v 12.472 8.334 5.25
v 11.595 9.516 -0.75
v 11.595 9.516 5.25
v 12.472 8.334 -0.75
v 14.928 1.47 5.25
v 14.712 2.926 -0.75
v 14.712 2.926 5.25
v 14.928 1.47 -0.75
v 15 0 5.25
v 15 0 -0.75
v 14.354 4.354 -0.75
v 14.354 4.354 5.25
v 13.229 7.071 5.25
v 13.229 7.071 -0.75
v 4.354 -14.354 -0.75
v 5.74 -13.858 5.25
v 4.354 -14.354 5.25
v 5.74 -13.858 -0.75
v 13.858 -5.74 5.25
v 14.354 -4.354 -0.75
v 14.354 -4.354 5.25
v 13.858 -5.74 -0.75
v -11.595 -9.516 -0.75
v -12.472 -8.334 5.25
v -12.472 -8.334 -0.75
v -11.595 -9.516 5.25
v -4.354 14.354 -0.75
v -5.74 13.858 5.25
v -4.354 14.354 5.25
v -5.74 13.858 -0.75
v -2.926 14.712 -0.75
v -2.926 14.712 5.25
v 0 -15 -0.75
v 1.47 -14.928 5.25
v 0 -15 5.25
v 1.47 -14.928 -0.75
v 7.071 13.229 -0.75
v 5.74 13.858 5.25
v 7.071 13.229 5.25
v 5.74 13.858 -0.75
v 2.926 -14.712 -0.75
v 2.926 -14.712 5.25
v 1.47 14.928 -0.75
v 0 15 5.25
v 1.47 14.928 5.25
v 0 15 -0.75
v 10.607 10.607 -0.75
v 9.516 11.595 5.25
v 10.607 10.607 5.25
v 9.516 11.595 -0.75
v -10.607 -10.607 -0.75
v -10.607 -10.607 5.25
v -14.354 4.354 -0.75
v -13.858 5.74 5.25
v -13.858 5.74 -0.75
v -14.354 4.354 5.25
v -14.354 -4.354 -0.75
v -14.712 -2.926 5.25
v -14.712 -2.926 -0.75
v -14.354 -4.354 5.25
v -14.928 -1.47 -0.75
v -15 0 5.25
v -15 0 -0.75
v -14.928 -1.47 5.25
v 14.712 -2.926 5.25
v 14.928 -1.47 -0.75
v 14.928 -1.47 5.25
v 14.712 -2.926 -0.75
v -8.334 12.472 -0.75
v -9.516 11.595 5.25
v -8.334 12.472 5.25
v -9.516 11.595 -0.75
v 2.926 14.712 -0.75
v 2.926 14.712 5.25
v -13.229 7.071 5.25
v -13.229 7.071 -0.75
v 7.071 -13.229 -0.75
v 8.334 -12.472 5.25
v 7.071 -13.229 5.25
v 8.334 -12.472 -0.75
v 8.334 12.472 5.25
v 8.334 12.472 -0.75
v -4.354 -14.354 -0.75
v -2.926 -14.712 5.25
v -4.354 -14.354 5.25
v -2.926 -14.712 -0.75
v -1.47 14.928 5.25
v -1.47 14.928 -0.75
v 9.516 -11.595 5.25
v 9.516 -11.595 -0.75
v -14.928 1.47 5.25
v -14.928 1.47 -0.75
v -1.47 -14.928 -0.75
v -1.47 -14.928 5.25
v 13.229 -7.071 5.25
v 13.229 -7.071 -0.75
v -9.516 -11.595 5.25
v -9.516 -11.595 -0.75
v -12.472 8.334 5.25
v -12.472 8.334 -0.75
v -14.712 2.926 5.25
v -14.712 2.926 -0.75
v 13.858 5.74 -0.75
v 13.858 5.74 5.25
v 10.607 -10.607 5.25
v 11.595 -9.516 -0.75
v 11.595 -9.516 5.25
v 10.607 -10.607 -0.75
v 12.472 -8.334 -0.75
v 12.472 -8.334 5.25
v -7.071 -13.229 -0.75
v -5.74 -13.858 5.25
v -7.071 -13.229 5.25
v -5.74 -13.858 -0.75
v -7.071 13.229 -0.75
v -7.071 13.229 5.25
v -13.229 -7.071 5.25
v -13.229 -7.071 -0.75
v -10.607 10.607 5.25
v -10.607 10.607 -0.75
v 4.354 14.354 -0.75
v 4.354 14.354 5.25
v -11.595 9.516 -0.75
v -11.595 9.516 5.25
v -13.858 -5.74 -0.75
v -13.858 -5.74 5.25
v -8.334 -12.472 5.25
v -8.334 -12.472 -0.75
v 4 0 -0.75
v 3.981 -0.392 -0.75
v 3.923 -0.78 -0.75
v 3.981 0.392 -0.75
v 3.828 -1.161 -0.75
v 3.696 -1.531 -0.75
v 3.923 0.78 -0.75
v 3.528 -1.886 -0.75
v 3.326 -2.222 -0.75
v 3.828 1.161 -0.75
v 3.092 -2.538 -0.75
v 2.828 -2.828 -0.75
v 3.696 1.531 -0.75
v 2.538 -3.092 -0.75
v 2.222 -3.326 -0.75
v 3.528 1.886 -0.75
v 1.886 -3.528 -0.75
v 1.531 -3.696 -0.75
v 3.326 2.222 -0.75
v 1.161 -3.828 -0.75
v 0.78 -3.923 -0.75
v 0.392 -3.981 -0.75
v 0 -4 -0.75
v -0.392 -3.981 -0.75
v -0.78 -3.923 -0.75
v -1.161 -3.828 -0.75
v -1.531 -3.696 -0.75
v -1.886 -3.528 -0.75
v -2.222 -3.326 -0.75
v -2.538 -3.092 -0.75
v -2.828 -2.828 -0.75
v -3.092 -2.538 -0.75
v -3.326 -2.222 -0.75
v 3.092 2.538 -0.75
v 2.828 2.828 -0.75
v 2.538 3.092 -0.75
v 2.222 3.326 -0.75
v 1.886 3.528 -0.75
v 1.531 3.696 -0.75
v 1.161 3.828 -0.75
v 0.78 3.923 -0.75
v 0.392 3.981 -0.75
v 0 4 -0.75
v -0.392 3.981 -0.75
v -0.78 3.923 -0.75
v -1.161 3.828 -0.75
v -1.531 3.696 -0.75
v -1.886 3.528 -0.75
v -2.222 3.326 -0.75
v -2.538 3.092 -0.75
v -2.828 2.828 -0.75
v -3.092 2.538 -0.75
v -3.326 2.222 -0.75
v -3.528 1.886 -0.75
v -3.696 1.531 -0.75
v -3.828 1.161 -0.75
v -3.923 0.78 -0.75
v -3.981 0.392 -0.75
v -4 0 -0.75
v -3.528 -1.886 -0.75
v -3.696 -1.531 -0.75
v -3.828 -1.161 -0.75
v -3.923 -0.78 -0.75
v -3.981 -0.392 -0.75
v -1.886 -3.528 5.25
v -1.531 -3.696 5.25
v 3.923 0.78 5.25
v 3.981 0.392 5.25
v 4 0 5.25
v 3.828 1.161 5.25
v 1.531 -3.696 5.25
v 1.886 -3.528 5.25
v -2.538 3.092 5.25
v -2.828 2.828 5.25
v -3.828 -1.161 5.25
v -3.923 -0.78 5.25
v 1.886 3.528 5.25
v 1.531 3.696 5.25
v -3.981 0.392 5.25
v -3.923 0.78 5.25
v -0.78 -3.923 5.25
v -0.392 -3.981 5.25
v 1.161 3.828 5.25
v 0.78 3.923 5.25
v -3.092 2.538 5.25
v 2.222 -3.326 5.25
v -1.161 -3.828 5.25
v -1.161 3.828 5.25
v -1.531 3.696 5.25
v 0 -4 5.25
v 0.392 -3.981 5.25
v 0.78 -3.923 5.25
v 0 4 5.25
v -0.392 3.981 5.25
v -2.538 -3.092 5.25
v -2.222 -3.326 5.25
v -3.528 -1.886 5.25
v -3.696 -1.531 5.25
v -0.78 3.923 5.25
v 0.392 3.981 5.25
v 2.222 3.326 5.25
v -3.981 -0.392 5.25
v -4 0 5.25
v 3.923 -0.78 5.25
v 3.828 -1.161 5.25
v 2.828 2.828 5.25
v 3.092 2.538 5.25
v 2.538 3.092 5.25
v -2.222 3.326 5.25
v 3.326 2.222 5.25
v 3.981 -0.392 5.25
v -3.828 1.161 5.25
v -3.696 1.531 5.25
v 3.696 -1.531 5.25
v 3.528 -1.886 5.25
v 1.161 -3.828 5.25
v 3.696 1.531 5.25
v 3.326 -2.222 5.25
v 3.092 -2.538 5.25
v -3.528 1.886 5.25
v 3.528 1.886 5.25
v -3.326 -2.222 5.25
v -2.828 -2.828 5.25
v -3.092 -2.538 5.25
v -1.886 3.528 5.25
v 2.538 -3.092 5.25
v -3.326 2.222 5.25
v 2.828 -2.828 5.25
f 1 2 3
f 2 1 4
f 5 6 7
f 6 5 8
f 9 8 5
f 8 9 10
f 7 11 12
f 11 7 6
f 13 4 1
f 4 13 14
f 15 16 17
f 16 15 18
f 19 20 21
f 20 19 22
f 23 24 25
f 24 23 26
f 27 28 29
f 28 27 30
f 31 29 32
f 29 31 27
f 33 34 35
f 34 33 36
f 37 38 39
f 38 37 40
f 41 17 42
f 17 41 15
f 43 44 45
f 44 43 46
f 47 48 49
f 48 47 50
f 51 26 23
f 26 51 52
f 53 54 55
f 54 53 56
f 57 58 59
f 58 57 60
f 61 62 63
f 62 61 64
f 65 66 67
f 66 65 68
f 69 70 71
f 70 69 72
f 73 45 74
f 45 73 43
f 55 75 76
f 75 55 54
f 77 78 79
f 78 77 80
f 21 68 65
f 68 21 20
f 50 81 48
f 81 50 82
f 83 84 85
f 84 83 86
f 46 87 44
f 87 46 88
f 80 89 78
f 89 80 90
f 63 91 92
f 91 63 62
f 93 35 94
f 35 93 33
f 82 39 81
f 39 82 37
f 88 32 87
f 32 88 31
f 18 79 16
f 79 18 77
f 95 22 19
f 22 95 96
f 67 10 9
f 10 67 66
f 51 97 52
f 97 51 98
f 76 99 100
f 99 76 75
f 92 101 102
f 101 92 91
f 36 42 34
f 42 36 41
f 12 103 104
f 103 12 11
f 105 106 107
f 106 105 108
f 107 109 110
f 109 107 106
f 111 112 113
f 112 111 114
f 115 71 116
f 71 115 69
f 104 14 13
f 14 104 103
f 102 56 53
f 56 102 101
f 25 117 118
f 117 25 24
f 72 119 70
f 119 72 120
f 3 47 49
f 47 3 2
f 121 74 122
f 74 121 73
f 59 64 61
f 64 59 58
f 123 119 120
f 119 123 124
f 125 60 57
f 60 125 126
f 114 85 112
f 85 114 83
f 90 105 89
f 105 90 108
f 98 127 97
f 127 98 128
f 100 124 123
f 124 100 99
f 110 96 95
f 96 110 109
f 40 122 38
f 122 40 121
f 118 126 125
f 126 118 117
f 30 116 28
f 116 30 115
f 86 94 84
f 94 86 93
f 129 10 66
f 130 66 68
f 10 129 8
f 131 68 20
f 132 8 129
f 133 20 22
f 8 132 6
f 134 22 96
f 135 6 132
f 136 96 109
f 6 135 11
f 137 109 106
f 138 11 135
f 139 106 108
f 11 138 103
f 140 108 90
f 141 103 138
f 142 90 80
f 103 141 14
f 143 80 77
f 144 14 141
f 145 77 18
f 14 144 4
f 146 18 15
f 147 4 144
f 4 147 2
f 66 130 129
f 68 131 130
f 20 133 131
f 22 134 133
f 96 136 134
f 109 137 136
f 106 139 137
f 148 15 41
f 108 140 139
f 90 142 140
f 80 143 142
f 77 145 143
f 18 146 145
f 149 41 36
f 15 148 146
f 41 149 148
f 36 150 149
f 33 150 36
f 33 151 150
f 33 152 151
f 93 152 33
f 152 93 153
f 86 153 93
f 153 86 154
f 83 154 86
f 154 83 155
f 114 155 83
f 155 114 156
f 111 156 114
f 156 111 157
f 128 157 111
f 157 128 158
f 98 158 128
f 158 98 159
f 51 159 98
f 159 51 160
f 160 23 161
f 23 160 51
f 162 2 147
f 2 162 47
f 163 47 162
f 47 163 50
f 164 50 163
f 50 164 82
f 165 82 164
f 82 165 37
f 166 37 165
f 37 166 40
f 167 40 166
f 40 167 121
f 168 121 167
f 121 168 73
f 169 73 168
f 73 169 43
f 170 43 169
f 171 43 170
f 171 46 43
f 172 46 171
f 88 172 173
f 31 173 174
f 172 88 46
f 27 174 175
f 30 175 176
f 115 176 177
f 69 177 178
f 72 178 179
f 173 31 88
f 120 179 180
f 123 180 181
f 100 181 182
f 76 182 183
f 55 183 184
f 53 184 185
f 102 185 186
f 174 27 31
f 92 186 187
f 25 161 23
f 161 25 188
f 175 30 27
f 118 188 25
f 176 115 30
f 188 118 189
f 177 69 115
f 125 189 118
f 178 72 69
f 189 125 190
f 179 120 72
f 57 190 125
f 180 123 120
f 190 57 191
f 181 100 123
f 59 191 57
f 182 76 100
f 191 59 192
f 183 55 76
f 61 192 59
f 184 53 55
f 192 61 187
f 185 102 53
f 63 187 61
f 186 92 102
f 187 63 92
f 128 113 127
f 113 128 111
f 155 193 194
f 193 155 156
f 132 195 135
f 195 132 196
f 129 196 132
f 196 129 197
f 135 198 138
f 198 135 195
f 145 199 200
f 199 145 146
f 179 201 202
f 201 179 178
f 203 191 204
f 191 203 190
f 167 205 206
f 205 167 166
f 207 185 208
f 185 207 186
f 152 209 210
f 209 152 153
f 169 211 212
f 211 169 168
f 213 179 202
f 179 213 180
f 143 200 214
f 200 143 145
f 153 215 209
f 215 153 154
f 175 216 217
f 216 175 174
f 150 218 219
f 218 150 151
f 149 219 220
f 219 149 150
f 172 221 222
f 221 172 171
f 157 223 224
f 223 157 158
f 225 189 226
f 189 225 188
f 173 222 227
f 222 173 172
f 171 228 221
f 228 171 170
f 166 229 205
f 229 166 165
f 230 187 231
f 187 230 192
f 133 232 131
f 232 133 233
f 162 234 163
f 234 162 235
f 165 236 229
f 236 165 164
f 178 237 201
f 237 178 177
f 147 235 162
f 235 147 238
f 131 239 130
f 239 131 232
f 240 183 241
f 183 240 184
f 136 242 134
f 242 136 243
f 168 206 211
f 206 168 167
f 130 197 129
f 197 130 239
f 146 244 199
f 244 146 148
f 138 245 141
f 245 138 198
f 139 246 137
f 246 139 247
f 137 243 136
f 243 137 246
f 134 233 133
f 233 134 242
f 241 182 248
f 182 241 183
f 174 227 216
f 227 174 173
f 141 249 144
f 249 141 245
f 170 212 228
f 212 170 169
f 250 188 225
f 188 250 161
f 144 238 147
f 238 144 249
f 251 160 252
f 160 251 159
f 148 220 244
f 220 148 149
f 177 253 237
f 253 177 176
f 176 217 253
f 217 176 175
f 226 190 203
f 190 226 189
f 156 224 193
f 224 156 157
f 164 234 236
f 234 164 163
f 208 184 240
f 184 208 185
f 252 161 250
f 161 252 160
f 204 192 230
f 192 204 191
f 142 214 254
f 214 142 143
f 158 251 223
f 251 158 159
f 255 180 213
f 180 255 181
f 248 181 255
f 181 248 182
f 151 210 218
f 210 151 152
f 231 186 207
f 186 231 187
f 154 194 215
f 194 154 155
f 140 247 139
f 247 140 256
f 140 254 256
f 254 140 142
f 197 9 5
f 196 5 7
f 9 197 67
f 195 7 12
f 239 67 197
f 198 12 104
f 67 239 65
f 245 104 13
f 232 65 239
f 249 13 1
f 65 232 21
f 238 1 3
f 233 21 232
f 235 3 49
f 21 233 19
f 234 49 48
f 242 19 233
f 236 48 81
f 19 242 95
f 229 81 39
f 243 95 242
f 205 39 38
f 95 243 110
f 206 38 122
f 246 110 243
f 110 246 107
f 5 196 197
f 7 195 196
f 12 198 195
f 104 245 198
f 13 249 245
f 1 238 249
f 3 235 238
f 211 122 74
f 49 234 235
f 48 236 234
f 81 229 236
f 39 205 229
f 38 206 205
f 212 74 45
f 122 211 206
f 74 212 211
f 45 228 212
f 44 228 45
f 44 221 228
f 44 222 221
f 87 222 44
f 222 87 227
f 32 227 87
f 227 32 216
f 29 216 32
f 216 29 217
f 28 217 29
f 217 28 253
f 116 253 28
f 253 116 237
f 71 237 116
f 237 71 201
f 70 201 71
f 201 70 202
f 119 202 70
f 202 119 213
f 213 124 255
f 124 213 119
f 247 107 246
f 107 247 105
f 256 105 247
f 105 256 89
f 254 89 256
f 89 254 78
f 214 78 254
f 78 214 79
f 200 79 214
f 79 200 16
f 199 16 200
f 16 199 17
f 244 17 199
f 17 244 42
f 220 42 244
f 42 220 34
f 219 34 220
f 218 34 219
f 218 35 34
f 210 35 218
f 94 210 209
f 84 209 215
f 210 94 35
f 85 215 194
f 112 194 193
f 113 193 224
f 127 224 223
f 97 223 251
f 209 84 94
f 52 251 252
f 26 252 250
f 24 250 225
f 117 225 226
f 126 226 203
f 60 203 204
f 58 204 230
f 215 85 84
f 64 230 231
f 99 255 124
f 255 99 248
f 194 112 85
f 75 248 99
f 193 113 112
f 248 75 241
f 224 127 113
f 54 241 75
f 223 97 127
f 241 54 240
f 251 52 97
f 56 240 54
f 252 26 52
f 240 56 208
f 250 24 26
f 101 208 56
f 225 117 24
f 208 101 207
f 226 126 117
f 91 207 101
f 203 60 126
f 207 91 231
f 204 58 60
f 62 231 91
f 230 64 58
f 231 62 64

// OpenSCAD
// Parameters
inner_hole_diameter_mm = 8; //[4:16:0.1]
outer_diameter_mm = 30; //[15:60:0.1]
thickness_mm = 1.5; //[0.75:3:0.05]

// M8 Penny Washer - complete geometry
module washer() {
  color("Silver") {
    difference() {
      // Outer cylinder
      cylinder(r=outer_diameter_mm/2, h=thickness_mm, center=true, $fn=64);
      // Inner hole
      cylinder(r=inner_hole_diameter_mm/2, h=thickness_mm*2, center=true, $fn=64);
    }
  }
}

// Penny Washer - identical to M8 Penny Washer for this example
module penny_washer() {
  washer();
}

// Screw And Washer - placeholder for custom geometry
module screw_and_washer() {
  color("DimGray") {
    // Placeholder geometry
    translate([0, 0, thickness_mm]) washer();
  }
}

// Round Grommet Assembly - placeholder for custom geometry
module round_grommet_assembly() {
  color("Black") {
    // Placeholder geometry
    translate([0, 0, thickness_mm*2]) washer();
  }
}

// Round Grommet Top - placeholder for custom geometry
module round_grommet_top() {
  color("Black") {
    // Placeholder geometry
    translate([0, 0, thickness_mm*3]) washer();
  }
}

// Final Assembly
module assembly() {
  washer();
  penny_washer();
  screw_and_washer();
  round_grommet_assembly();
  round_grommet_top();
}

assembly();
